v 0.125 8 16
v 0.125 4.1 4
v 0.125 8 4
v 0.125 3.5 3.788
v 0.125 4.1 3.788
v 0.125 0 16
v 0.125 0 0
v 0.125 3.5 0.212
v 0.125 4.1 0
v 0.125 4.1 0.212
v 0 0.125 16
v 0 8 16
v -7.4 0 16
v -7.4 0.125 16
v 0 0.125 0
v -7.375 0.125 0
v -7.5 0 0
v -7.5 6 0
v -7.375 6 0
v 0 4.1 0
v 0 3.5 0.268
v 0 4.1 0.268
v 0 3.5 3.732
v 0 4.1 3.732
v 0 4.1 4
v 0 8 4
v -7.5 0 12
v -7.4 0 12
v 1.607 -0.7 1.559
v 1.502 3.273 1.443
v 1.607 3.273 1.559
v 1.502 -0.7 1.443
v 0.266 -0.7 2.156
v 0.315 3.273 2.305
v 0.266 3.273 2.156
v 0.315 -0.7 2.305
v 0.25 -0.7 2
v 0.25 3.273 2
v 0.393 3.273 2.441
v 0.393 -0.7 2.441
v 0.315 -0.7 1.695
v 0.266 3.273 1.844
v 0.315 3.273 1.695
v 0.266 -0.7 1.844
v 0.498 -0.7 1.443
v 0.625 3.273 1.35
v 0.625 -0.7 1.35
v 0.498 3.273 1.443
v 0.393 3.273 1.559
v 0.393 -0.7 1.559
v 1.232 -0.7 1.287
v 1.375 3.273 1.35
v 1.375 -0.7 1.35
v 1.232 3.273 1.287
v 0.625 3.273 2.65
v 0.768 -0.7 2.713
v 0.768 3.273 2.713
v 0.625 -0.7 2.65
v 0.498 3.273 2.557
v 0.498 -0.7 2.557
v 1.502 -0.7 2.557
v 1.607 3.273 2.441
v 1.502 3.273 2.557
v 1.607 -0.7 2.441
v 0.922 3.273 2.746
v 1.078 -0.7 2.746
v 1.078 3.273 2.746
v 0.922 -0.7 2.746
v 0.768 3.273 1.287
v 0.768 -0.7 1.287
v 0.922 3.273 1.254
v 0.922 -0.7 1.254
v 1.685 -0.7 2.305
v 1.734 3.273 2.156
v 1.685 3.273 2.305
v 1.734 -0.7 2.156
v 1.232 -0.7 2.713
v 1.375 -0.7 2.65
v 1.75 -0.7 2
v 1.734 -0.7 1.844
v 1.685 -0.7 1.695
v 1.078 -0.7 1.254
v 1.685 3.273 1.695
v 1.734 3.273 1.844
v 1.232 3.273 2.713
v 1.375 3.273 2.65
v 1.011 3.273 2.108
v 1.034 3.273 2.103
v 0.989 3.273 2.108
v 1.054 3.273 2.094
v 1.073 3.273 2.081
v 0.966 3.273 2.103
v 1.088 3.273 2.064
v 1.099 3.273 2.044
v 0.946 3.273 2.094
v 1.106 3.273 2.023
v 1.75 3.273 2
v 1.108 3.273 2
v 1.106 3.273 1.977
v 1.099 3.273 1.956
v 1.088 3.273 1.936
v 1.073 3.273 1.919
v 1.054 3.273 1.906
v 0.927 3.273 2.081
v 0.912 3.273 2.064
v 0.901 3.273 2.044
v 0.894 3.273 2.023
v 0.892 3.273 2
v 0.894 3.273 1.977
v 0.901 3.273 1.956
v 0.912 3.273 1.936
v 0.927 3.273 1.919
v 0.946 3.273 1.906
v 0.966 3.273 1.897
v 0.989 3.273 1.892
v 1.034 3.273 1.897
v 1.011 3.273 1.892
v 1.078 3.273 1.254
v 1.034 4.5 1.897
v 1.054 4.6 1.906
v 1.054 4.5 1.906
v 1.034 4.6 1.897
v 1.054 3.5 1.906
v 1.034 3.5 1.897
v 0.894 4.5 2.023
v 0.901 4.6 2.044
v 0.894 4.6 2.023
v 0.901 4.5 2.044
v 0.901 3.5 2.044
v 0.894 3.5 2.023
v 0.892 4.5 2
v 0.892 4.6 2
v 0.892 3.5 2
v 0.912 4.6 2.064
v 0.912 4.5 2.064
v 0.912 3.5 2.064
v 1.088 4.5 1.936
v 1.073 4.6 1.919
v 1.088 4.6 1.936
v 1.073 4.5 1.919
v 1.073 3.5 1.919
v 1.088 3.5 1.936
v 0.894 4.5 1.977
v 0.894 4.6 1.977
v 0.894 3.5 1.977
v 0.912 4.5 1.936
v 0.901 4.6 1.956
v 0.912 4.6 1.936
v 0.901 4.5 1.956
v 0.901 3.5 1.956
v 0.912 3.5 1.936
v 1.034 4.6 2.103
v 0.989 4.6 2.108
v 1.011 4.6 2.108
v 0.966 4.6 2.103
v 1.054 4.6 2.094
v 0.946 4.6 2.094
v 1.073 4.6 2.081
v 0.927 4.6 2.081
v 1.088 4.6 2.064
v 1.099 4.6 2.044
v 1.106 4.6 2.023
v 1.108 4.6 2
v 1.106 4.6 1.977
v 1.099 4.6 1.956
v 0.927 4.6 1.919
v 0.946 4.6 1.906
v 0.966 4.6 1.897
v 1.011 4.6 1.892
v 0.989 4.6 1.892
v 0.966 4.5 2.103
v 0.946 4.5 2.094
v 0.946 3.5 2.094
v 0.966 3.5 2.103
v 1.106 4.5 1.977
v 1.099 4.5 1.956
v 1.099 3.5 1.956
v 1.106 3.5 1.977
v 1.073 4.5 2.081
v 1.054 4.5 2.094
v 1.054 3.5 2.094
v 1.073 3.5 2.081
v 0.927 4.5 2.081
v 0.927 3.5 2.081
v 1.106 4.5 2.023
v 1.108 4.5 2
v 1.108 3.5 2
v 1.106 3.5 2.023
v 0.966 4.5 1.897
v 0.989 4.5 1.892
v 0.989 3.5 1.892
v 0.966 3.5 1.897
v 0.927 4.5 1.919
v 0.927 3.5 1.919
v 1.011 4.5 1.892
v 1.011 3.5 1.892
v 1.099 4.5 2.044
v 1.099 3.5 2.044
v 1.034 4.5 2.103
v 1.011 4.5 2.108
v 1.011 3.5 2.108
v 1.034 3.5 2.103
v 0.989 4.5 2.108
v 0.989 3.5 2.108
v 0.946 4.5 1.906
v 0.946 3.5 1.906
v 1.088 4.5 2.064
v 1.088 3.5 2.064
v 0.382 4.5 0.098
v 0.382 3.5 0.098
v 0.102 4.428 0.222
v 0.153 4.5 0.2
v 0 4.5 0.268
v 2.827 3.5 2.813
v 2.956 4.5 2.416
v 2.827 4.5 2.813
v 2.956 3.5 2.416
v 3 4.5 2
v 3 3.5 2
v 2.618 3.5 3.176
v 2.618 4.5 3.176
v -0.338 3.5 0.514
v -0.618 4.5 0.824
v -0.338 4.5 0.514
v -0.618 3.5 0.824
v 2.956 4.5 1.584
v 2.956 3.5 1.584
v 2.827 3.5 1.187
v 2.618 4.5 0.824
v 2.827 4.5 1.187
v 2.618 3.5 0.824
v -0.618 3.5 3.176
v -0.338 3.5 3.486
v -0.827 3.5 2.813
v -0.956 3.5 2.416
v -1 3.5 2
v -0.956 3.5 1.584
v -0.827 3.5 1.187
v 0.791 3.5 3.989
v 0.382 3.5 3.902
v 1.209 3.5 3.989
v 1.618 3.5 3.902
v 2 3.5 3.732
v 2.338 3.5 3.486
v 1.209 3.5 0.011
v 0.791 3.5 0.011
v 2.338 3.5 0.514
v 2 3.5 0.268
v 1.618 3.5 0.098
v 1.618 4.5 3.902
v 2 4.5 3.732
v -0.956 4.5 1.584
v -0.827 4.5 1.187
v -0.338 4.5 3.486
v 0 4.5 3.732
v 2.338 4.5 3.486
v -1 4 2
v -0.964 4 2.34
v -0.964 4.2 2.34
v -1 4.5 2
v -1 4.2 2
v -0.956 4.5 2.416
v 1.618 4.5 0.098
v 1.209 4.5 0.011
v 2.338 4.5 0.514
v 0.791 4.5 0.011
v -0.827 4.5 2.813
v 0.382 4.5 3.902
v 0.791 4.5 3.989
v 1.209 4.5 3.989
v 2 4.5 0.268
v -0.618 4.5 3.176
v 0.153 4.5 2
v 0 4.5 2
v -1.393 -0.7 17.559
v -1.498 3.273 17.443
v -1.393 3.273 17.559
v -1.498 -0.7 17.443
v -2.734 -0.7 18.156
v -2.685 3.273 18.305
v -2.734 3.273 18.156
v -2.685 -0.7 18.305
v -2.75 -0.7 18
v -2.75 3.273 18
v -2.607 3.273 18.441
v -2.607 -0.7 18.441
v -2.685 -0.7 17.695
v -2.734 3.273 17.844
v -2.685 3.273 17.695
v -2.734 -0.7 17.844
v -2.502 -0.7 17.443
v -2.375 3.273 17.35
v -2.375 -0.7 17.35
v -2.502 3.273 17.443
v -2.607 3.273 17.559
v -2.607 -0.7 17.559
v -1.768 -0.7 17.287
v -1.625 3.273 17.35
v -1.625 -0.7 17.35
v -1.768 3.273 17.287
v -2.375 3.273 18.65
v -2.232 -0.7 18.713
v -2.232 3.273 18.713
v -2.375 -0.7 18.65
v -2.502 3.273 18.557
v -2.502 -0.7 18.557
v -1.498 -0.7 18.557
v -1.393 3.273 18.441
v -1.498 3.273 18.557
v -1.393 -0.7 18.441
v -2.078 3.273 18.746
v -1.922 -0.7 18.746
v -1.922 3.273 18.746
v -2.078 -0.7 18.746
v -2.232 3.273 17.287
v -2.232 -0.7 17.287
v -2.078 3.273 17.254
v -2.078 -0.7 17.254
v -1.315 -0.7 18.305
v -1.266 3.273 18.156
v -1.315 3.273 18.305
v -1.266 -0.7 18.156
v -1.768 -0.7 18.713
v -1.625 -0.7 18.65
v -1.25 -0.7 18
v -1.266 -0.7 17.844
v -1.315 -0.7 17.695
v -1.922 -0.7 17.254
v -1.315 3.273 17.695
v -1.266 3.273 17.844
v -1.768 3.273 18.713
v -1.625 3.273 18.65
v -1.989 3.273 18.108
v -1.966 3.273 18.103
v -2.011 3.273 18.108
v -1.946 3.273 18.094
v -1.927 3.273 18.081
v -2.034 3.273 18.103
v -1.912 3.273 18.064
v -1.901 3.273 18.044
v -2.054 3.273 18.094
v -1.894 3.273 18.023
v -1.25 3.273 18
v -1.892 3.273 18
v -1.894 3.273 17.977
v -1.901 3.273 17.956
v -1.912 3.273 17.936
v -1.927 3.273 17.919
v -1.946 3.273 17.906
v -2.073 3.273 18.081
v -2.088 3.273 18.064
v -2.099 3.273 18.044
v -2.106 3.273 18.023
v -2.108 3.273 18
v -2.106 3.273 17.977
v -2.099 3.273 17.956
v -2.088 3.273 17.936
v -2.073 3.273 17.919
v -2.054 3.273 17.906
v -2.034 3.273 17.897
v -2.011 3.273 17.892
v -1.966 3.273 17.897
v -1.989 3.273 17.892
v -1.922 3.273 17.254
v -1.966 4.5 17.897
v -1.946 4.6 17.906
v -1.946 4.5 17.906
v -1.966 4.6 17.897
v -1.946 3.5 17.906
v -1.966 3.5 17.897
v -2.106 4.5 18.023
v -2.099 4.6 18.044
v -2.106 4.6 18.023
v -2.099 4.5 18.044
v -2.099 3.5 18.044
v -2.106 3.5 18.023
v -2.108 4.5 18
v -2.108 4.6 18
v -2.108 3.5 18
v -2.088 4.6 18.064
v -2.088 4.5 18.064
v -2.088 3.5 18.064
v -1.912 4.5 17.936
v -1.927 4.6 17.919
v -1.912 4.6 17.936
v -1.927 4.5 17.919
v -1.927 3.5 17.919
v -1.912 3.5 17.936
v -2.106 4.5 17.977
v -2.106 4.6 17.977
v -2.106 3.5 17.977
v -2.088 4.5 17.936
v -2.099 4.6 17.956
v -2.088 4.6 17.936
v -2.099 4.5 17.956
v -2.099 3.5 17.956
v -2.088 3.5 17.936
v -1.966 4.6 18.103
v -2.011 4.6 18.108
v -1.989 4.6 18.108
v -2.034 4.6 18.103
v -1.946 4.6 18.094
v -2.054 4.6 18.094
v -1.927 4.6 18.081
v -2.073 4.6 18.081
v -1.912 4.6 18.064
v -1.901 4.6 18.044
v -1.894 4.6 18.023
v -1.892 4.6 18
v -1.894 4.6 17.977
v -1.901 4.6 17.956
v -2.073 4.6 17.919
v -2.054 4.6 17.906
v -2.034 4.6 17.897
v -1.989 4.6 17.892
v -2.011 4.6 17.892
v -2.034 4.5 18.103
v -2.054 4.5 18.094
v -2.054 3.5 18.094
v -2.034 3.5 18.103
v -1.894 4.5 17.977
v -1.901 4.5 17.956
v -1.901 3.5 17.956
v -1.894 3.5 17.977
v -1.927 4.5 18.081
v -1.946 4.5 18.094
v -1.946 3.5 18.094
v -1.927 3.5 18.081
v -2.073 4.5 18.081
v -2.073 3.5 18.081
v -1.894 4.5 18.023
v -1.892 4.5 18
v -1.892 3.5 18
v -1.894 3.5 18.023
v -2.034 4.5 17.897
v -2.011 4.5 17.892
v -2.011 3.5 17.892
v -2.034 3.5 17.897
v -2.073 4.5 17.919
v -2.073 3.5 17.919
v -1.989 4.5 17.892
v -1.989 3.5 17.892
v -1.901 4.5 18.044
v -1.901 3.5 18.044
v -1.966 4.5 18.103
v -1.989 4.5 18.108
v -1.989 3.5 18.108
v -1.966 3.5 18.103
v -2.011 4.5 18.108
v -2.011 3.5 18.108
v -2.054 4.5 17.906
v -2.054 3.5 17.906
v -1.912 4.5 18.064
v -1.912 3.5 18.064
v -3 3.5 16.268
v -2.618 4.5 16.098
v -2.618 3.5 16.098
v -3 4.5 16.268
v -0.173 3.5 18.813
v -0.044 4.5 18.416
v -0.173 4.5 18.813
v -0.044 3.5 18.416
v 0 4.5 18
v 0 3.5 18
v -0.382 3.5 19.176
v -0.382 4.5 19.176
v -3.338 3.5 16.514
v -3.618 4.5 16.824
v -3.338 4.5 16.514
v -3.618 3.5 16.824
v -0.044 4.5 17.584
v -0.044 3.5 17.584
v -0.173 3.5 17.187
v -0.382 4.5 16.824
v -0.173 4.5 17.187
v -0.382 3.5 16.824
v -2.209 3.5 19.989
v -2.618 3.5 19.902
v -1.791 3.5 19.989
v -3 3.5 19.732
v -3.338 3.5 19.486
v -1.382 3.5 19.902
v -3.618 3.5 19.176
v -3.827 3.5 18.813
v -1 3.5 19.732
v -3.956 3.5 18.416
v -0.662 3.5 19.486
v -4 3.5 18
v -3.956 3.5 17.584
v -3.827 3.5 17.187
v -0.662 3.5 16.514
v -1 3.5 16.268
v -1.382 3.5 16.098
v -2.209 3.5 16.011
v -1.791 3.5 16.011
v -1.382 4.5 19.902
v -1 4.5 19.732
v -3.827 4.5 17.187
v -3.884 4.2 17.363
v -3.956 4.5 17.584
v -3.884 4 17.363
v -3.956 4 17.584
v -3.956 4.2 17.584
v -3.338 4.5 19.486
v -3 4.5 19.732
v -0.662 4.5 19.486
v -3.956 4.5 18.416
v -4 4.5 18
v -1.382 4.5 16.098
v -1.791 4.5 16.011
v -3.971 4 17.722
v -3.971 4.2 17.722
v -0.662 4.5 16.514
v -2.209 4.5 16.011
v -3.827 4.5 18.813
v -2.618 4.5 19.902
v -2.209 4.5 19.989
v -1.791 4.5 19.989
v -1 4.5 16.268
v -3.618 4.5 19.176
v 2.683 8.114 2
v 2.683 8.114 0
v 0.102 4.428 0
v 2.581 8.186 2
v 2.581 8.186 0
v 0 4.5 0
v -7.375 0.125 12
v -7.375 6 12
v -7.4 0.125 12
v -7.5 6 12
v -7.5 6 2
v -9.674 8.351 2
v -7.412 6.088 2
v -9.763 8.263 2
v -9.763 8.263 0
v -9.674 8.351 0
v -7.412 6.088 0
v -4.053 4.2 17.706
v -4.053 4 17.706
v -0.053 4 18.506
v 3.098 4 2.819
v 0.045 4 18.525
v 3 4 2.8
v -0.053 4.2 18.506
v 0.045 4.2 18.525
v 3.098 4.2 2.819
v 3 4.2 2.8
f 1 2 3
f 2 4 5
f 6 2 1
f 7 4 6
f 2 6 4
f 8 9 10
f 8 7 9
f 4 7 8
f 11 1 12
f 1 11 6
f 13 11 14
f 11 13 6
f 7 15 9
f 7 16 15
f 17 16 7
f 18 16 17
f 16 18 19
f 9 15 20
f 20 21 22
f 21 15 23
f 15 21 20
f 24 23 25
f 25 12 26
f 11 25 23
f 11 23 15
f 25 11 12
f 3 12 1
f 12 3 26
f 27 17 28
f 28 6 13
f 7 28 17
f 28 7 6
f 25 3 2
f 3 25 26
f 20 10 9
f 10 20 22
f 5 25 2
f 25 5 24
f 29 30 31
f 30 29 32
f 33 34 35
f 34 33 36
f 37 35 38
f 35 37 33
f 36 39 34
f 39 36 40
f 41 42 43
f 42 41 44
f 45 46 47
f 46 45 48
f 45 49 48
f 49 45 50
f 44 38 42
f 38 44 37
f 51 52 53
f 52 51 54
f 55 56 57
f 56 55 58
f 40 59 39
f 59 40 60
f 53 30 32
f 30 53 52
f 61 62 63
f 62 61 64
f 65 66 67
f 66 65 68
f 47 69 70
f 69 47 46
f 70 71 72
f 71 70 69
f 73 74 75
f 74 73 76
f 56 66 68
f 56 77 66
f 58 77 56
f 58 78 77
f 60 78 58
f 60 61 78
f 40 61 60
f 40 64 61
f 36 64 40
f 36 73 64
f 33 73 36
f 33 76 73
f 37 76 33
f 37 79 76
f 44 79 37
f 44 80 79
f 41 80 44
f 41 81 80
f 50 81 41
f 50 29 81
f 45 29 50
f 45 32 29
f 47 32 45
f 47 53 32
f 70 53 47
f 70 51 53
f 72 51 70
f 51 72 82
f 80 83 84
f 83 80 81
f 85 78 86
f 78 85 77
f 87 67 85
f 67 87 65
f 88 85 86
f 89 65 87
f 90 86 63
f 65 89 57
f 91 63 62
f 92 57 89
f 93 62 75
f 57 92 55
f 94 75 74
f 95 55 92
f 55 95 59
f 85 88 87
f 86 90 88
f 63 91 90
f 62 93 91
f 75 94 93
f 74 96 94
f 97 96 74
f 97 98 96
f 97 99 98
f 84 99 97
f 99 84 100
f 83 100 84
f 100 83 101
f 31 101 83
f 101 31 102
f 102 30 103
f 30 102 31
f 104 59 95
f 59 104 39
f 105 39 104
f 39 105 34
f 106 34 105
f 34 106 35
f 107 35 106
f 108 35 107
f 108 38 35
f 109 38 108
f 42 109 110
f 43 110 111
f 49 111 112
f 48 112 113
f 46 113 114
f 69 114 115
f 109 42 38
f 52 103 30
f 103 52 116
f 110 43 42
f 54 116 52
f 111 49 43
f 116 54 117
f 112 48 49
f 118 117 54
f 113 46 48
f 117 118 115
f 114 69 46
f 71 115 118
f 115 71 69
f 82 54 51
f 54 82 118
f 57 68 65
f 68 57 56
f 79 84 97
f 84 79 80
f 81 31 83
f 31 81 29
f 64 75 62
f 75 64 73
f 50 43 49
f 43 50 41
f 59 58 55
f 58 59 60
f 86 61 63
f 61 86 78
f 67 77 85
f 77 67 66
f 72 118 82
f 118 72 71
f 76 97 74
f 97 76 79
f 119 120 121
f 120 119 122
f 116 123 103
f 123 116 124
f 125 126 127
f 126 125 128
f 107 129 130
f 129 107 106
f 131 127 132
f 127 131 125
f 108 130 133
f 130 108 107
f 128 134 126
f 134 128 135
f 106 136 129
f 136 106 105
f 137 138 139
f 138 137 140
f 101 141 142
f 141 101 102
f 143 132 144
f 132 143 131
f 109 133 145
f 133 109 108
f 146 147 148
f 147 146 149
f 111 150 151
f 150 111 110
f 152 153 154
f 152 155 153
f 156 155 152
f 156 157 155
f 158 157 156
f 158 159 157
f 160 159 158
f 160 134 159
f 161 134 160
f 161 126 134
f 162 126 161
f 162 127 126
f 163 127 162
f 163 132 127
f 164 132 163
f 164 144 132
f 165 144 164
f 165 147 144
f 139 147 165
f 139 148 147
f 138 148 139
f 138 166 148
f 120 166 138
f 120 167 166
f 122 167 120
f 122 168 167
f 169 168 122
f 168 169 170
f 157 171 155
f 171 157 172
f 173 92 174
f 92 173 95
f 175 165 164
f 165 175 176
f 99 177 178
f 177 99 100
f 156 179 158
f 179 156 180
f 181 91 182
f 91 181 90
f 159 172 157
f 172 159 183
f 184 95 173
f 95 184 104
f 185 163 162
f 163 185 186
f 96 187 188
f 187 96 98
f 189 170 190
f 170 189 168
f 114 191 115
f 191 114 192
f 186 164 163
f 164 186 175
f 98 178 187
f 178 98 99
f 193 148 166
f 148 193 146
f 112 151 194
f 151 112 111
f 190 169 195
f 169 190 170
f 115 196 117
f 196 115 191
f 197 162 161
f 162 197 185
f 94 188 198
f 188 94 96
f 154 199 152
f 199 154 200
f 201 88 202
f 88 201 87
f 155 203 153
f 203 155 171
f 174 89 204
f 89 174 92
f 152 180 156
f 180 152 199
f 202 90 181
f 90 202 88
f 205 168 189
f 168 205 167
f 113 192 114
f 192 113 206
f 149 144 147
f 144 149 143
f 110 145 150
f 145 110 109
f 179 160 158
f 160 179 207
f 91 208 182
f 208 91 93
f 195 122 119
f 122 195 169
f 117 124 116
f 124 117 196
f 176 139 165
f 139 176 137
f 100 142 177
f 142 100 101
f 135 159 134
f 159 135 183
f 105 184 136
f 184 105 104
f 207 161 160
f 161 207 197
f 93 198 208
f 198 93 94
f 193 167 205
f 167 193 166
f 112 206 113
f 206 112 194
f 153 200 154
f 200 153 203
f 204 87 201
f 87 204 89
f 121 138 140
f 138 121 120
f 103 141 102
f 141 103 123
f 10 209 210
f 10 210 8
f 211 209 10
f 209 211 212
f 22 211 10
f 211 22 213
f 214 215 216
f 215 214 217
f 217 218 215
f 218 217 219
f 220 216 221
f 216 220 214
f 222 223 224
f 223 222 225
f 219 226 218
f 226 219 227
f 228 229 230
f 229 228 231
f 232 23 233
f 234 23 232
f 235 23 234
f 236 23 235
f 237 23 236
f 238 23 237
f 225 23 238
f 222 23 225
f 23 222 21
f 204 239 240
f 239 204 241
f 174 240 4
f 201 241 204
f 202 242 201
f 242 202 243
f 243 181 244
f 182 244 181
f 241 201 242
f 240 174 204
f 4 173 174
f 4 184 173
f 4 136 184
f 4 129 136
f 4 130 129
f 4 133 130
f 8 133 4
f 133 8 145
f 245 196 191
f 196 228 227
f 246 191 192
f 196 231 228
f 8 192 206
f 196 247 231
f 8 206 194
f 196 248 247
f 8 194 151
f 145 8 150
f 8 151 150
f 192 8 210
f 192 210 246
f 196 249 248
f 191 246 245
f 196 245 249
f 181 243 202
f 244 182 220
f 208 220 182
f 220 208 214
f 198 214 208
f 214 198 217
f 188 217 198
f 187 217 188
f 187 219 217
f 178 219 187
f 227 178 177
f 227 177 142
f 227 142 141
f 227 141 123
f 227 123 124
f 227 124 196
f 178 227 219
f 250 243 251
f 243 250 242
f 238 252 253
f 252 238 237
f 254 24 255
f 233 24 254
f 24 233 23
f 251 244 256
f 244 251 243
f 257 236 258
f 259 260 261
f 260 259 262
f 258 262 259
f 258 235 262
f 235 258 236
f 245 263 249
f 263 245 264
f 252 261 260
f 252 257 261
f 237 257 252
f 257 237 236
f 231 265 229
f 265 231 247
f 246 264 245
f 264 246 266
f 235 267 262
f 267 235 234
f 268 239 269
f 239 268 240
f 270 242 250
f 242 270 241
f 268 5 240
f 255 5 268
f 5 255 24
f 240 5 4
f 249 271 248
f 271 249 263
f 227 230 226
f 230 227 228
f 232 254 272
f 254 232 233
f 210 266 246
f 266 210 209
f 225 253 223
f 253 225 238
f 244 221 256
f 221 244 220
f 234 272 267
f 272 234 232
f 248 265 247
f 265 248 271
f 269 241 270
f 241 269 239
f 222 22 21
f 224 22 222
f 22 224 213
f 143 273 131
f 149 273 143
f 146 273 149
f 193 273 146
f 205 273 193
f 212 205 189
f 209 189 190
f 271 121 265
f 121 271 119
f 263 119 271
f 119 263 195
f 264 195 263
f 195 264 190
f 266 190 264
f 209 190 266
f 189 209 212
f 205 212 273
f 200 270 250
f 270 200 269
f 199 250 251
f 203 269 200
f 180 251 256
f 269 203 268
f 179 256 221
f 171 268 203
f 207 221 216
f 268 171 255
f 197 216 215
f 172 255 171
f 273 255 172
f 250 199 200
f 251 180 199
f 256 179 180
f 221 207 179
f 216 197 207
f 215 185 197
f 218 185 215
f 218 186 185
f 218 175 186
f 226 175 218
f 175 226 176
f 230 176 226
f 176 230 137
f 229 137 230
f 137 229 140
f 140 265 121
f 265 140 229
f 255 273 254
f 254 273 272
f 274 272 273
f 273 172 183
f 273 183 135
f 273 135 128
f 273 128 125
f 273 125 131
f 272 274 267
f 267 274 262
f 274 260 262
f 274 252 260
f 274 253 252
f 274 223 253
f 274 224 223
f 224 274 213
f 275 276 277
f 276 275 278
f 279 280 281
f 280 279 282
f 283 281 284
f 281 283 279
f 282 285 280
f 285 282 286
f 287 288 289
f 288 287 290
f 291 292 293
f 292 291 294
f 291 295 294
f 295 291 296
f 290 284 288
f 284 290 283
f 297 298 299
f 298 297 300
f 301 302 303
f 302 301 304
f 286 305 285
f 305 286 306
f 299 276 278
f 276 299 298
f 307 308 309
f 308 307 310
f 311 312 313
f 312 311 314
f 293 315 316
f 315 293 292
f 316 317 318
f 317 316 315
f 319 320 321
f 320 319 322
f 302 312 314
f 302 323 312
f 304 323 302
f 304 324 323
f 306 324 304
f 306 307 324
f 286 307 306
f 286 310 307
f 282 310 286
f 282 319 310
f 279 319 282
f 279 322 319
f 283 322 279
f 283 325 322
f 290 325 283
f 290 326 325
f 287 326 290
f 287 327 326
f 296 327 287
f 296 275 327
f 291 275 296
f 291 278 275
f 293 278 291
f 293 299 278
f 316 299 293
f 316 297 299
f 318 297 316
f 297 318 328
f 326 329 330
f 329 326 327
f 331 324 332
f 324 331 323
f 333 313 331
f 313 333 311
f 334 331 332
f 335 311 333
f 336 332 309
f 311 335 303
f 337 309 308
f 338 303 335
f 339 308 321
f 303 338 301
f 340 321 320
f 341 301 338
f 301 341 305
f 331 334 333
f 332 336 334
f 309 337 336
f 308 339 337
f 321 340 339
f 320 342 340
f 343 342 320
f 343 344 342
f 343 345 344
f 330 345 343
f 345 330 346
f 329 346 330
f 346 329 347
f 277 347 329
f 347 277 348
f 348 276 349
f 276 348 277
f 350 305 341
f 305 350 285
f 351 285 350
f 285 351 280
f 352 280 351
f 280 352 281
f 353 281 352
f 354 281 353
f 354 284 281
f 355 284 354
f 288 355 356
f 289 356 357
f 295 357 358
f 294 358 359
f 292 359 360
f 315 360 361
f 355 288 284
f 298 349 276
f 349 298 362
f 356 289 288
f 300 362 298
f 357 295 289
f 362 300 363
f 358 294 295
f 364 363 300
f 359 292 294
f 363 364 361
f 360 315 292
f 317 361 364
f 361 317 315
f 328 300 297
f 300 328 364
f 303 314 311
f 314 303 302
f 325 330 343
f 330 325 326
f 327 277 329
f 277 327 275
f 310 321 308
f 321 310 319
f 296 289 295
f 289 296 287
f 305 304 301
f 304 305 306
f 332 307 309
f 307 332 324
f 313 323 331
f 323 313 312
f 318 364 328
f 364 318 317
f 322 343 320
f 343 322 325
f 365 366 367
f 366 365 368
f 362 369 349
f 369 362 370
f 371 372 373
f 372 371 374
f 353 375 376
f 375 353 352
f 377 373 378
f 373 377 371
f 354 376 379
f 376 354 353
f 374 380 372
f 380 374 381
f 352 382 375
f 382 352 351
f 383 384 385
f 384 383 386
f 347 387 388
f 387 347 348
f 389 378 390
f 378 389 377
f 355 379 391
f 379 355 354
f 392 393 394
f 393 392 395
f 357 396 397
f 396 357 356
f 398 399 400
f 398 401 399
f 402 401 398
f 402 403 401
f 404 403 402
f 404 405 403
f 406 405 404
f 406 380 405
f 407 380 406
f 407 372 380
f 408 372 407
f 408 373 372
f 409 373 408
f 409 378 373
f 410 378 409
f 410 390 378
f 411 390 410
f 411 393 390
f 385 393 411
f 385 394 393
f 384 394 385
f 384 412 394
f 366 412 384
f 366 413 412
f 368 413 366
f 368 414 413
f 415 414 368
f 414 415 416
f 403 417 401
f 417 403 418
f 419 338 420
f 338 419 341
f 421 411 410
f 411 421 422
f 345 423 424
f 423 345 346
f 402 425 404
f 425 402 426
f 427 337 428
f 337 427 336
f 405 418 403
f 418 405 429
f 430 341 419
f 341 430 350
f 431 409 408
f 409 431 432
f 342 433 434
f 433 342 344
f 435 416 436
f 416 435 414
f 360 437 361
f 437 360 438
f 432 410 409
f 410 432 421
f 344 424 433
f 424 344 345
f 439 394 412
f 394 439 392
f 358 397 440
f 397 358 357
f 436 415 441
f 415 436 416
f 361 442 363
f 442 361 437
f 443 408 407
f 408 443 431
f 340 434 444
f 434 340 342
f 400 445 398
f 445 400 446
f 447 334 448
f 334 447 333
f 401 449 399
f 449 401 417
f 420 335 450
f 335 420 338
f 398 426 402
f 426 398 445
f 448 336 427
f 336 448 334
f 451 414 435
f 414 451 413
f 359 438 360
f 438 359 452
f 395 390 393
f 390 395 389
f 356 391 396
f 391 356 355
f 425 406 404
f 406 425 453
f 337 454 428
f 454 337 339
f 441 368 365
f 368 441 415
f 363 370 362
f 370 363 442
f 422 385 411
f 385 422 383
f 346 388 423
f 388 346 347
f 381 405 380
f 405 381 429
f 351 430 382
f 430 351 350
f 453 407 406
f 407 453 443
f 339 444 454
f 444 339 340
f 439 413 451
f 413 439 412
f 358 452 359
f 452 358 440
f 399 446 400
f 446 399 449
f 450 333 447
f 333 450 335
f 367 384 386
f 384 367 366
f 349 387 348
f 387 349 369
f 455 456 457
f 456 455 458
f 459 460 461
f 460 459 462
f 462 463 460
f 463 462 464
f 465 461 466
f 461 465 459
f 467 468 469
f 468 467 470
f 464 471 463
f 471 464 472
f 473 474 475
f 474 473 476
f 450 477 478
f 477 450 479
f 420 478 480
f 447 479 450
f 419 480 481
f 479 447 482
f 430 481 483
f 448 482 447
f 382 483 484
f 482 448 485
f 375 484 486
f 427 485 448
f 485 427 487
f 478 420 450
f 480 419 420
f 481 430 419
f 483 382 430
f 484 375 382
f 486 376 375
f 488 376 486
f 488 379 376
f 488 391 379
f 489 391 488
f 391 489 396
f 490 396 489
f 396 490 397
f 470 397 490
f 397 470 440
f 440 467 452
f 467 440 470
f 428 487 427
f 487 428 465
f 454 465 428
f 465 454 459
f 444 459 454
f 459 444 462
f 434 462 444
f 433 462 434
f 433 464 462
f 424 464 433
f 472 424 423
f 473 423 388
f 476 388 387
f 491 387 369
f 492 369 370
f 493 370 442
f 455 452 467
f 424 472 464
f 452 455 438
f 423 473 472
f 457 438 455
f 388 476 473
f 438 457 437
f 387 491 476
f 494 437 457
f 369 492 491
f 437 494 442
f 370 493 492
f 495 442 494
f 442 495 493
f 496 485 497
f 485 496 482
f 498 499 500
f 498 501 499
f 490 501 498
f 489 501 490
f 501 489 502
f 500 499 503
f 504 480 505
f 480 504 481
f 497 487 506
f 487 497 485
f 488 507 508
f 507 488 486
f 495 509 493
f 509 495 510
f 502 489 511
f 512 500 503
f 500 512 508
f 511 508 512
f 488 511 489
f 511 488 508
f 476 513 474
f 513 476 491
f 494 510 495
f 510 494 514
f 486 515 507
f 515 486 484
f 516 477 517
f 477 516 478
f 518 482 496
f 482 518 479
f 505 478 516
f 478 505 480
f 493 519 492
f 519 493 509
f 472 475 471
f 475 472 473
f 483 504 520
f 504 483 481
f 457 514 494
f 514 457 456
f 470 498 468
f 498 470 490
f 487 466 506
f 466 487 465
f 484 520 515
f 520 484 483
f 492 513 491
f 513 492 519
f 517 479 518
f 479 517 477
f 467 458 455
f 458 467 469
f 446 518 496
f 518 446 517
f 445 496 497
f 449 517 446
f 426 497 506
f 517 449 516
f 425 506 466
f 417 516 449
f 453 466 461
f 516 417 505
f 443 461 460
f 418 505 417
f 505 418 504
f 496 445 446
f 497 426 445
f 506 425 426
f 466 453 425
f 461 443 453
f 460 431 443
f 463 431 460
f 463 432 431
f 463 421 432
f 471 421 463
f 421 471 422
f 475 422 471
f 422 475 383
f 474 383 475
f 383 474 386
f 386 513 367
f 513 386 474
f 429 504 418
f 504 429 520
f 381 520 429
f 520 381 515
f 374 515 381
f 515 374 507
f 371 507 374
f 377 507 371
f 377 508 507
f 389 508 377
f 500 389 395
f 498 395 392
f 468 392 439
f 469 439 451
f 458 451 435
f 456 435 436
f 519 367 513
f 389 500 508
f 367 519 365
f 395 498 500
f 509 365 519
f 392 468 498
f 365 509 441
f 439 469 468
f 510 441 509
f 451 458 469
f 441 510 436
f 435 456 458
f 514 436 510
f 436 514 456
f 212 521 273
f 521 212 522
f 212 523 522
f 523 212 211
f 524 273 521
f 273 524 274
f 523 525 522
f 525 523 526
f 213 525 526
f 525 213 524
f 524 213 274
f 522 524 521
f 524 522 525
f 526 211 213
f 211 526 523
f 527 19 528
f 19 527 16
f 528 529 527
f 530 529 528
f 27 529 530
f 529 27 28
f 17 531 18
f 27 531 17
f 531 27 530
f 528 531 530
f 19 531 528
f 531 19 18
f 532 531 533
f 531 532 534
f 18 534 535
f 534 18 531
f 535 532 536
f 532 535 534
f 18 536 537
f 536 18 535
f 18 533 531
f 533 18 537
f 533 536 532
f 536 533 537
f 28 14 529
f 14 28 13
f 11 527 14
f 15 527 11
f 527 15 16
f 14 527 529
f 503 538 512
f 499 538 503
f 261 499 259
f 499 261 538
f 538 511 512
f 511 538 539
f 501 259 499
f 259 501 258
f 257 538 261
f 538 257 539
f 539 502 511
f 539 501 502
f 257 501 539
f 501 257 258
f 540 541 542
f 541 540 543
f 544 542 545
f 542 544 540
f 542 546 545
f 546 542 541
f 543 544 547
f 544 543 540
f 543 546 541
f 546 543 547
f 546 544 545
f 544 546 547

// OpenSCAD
// file: RobotPrimitives.scad
//Triangle functions
//Return 3rd side for side_angle_side triangle
function Triangle_SAS_S() = sqrt((pow($L1, 2)) + (pow($L2, 2)) - (2 * $L1 * $L2 * cos($A)));
//Return included angle given 3 sides
function Triangle_SSS_A() = acos((pow($A1 , 2) + pow($A2, 2) - pow($O, 2)) / (2 * $A1 * $A2));

$HexToRScale        = 1.23607;

module RobotBaseSimple($DriveWheelDiameter = 6, $DriveFrameSize      = [28, 28.5, 3], $BumperDepth = 3.5)
{
    $DriveFrameSizeInner = [$DriveFrameSize[0] - 6, $DriveFrameSize[1] - 6, $DriveFrameSize[2] + 0.05];
    $BumperSize          = [$DriveFrameSize[0] + ($BumperDepth * 2), $DriveFrameSize[1] + ($BumperDepth * 2), 5];
    $FrontGap            = $DriveFrameSize[0] - 12;

    translate([0, 0, $DriveWheelDiameter / 2])
	difference()
	{
		union()
		{
			color([0.7, 0.2, 0.6, 0.5])
			difference()
			{
				cube($DriveFrameSize, center = true);
				cube($DriveFrameSizeInner, center = true);
			}
            translate([0, 0, 2])
 			color([0.3, 0.1, 0.5, 0.5])
            difference()
            {
				cube($BumperSize, center = true);
				cube($BumperSize - [2 * $BumperDepth, 2 * $BumperDepth, -1], center = true);
            }
			translate([13, 0, 0])
				WheelSet();
			translate([-13, 0, 0])
				WheelSet();
		}
		translate([0, 10, 0])
			cube([$FrontGap, 20, 30], center = true);
	}
}

module WheelSet()
{
	color("white")
	rotate(90, [0, 1, 0])
	{
		translate([0, -11, 0])
			cylinder(d = $DriveWheelDiameter, h = 1, $fn = 40, center = true);
		cylinder(d = $DriveWheelDiameter, h = 1, $fn = 40, center = true);
		translate([0, 11, 0])
			cylinder(d = $DriveWheelDiameter, h = 1, $fn = 40, center = true);
	}
}

module Tube($W = 2, $T = 1, $HoleDiameter = 1/4, $Center = 0, $Holes = undef)
{
	if ($Holes != undef)
		echo ($W,$T, $L, $Holes);
	else
		echo ($W,$T, $L);

	translate([0, 0, -$Center * ($L / 2)])
	{
		color("BLACK")
			translate([0, 0, $L / 2])
				WireBox($W = $W + 0.01, $T = $T + 0.01, $L = $L + 0.01);
		
		color([0.7, 0.7, 0.7])
			difference()
			{
				translate([-$W/2, -$T/2, 0])
					cube([$W, $T, $L]);
				translate([0.1-$W/2, 0.1-$T/2, -0.05])
					cube([$W - 0.2, $T - 0.2, $L + 0.1]);
				for($HoleCoord=$Holes)
				{
					translate([$HoleCoord[1], 0, $HoleCoord[0]])
						rotate(90, [1, 0, 0])
	#						cylinder(d = $HoleDiameter, h = $T + 2.1, $fn = 20, center = true);
				}
			}
		}
}

module WireBox()
{
	$OutlineSize = 0.05;
	difference()
	{
		cube([$W, $T, $L], center = true);
		cube([$W - $OutlineSize, $T - $OutlineSize, $L + 0.1], center = true);
		cube([$W + 0.1,          $T - $OutlineSize, $L - $OutlineSize], center = true);
		cube([$W - $OutlineSize, $T + 0.1         , $L - $OutlineSize], center = true);
	}
}

module FlatLBracket($L = 2.5, $W = 0.5)
{
	color($BracketColor)
	{
		cube([3/16, $W, $L]);
		cube([3/16, $L, $W]);
	}
}

module FlatPlate($L = 2.5, $W = 0.5)
{
	color($BracketColor)
	{
		cube([3/16, $W, $L]);
	}
}

module LBracket($L = 2.5, $W = 0.5)
{
	translate([-3/16, 0, 0])
		color($BracketColor)
		{
			cube([3/16, $W, $L]);
			translate([3/16, 0, 0])
				rotate(-90, [0, 1, 0])
					cube([3/16, $W, $L]);
		}
}

module CornerBracket($L = 2.5, $W = 0.5)
{
	translate([-3/16, 0, 0])
		color($BracketColor)
		{
			cube([3/16, $W, $L]);
			translate([3/16, 0, 0])
				rotate(-90, [0, 1, 0])
					cube([3/16, $W, $L]);
			translate([-$L, 0, 0])
			difference()
			{
				translate([3/16, 0, 3/16])
					cube([$L - (3/16), 3/16, $L - (3/16)]);
				translate([0, -0.02, 0])
					rotate(-45, [0, 1, 0])
						cube([$L * 1.5, 4/16, $L * 1.5]);

			}
		}
}

module VBearing($ID = 3/8, $OD = 1.2, $T = 3/8)
{
	difference()
	{
		union()
		{
			color("SILVER")
			{
				translate([0, 0, 0 * ($T / 4)])
					cylinder(d1 = $OD - .3, d2 = $OD, h = $T / 4, $fn = 50);
				translate([0, 0, 1 * ($T / 4)])
					cylinder(d2 = $OD - .3, d1 = $OD, h = $T / 4, $fn = 50);
				translate([0, 0, 2 * ($T / 4)])
					cylinder(d1 = $OD - .3, d2 = $OD, h = $T / 4, $fn = 50);
				translate([0, 0, 3 * ($T / 4)])
					cylinder(d2 = $OD - .3, d1 = $OD, h = $T / 4, $fn = 50);
			}
			color("BLACK")
				translate([0, 0, -0.01])
					cylinder(d = $ID + 0.2, h = $T + 0.02, $fn = 50);
		}
		translate([0, 0, -0.02])
			cylinder(d = $ID, h = $T + 0.04, $fn = 50);
	
	}
}

module NeverestSprocket()
{
  $fn = 40;
  $GuideInnerDiameter = (($SprocketTeethCount * 0.25) / 3.141);
  $GuideOuterDiameter = $GuideInnerDiameter + ((3/8));
  $SprocketTeethCount = 16;
  difference()
  {
    difference()
    {
      union()
      {
        translate([0, 0, (0.25 / 2)])
          scale(1/25.4)
          sprocket($ChainSize, $SprocketTeethCount, 0, 0, 0, $ChainGuideAngle);
        difference()
        {
          translate([0, 0, -0.22])
            cylinder(d = $GuideInnerDiameter - (7 / 25.4), h = 0.8, $fn = $SprocketTeethCount * 2);
          translate([0, .25, 0])
            cube([.22, .13, 5], center = true);
         }
      }
      difference()
      {
        cylinder(d = 0.25, h = 5, $fn = 20, center = true);
        translate([0, .35, 0])
          cube([.5, .5, 5], center = true);
      }
    }
    translate([0, 0, .18 - .27])
      rotate(-90, [1, 0, 0])
        cylinder(d = 4/25.4, h = 3, $fn = 20);
    translate([0, 0, .18 + .27])
      rotate(-90, [1, 0, 0])
        cylinder(d = 4/25.4, h = 3, $fn = 20);
  }
}

module HexSprocket()
{
  $GuideInnerDiameter = (($SprocketTeethCount * 0.25) / 3.141);
  $GuideOuterDiameter = $GuideInnerDiameter + ((3/8));
  {
    difference()
    {
      union()
      {
        translate([0, 0, (0.25 / 2)])
          scale(1/25.4)
          sprocket($ChainSize, $SprocketTeethCount, 0, 0, 0, $ChainGuideAngle);
        cylinder(d = $GuideInnerDiameter - (7 / 25.4), h = ((0.11 + 0.25)), $fn = $SprocketTeethCount * 2);
      }
      HexShaft($D = $HexBore, $L = 5, $Center = true);
    }
  }
}

module HexShaft($D = 0.5, $L = 5, $Center = false)
{
		cylinder(d = $D * $HexToRScale, h = $L, $fn = 6, center = $Center);
}

module NeverRestHexShaftMotorCoupler($HexShaftBore = 0.515)
{
  difference()
  {
    difference()
    {
      union()
      {
        difference()
        {
          translate([0, 0, -0.22])
            cylinder(d = 1.3, h = 0.8, $fn = 6);
          translate([0, .25, -0.42])
            cube([.22, .13, 1], center = true);
         }
      }
      difference()
      {
        cylinder(d = 0.25, h = 5, $fn = 20, center = true);
        translate([0, .35, 0])
          cube([.5, .5, 5], center = true);
      }
    }
    translate([0, 0, .18 - .25])
      rotate(-90, [1, 0, 0])
        cylinder(d = 4/25.4, h = 3, $fn = 20);
    translate([0, 0, .58 - 0.5])
      HexShaft($D = $HexShaftBore, $L = 1);
  }
}

module HexBearing()
{
  rotate(-90, [1, 0, 0])
    color([0.4, 0.4, 0.5])
      difference()
      {
        union()
        {
          cylinder(d = 1.225, h = 0.063, $fn = 40);
          translate([0, 0, 0.063])
            cylinder(d = 1.124, h = 0.25, $fn = 40);
        }
        if ($Shaft == 1)
        {
          translate([0, 0, -0.1])
            cylinder(d = 0.5, h = 2, $fn = 6);
        }
      }
}

module HexCoupler()
{
  color([0.3, 0.3, 0.4])
    rotate(90, [1, 0, 0])
      difference()
      {
        intersection()
        {
          cylinder(d = 1, h = 1.5, $fn = 20, center = true);
          cube([1, .879, 1.5], center = true);
        }
        cylinder(d = 0.5, h = 1.6, $fn = 6, center = true);
      }
}

module Wheel($Color = $ShooterFlywheelColor, $Diameter = $FlyWheelDiameter, $Thickness = 1)
{
  //Flywheel
    color($Color)
      cylinder(d = $Diameter, h = $Thickness, $fn = 30, center = true);
}

module MiniCIM()
{
  //Mounting Spaced at 2"
  color([0.2, 0.2, 0.2])
    cylinder(d = 2.5, h = 3.55, $fn = 30);
  color("SILVER")
    cylinder(d = 0.315, h = 3.55 + 1.402, $fn = 30);
}

module Neverest()
{
  color([0.6, 0.7, 0.75])
    cylinder(d = 1.5, h = 2.24 + 0.709 + 1.024, $fn = 30);
  color("SILVER")
    cylinder(d = 0.217, h = 5.3, $fn = 30);
}
// main file
use <RobotPrimitives.scad>

/* [Action] */
$Action = 5; //[1:Trajectory sim, 2:Launcher V1, 3:Launcher V2, 4:Full bot V1, 5: Ball intake]

/* [Trajectory sim] */
//Initial velocity exiting parallel to shooter (m/s)
$MuzzleVelocity = 7.5;
//Launch angle
$Angle = 70;
//Time of simulation in seconds
$SimDuration = 1;
//number of steps in simulation
$SimSteps = 20;
//Distance from wall to start line (inches)
$StartLineOffset = 50;

/* [Shooter] */
$FlyWheelDiameter = 4;
$Style = 0;//[0:Square, 1:Round]
$FeedFrom = 1;//[0:Top, 1:Bottom]
$MotorPlacement = 0;//[0:Outer, 1:Inner]

//Shooter parameters
$ShooterFeederSpacing = 8;
$ShooterGuideOpening = 8;

$LaunchCompression = 1;//
$ShooterV2GuideOpening = 8;//Width of the guide channel

/* [Hidden] */
$va = -9.8;//Vertcal acceleration (9.8m/s^2)
$ha = 0;//Zero acceleration horizontally
$BallDiameter = 7;
$inchtom = 0.0254;
$mtoinch = 1/$inchtom;
$mtofeet = $mtoinch / 12;
$Explode = 1.0;

$ShooterV2FeederSpacing = $BallDiameter + $FlyWheelDiameter - $LaunchCompression;//Spacing between drive wheel set centers

$ShooterFlywheelColor = [0.7, 0.1, 0.2];

DoAction();

module DoAction()
{
  if ($Action == 1)
  {
    scale($mtofeet * 12)
      ShooterTrajectoryTest();
  }
  else if ($Action == 2)
    ShooterV1Model();
  else if ($Action == 3)
    ShooterV2Model();
  else if ($Action == 4)
    FullBotV1();
  else if ($Action == 5)
    BallIntake();
}

module FullBotV1()
{
  $FlyWheelDiameter = 4;
  $Style = 1;//[0:Square, 1:Round]
  $FeedFrom = 1;//[0:Top, 1:Bottom]
  $MotorPlacement = 1;//[0:Outer, 1:Inner]
  
  RobotBaseSimple();
  translate([-7.5, -8, 22])
    rotate(180, [0, 0, 1])
      ShooterV2Model();
  translate([0, 10, 3.5])
    Ball();
  translate([4, 6, 3])
    BallIntake();
}

module BallIntake()
{
  //Left, drive plate
  difference()
  {
    cube([0.125, 8, 16]);
    translate([-0.01, 4.1, 0])
      cube([0.225, 4, 4]);
  }
    translate([0, 4.5, 0])
      rotate(-35, [0, 0, 1])
        cube([0.125, 4.5, 2]);
  //Right side
  translate([-7.5, 0, 0])
    cube([0.125, 6, 12]);
    translate([-7.5, 6.0, 0])
      rotate(45, [0, 0, 1])
        cube([0.125, 3.2, 2]);
  //Back
  translate([-7.4, 0, 0])
    cube([7.5, 0.125, 16]);
  //Drive wheel
  translate([1, 4, 2])
    rotate(90, [1, 0, 0])
    {
      Wheel($Diameter = 4, $Thickness = 1);
      translate([0, 0, 4.7])
        rotate(180, [0, 1, 0])
          Neverest();
    }
  //Kick wheel
  translate([-2, 4, 18])
    rotate(90, [1, 0, 0])
    {
      Wheel($Diameter = 4, $Thickness = 1);
      translate([0, 0, 4.7])
        rotate(180, [0, 1, 0])
          Neverest();
    }
  //Belt
  translate([-1, 4, 2])
    rotate(-11, [0, 1, 0])
      color("BLACK")
        cube([.1, .2, 16]);
  translate([3, 4, 2.8])
    rotate(-11, [0, 1, 0])
      color("BLACK")
        cube([.1, .2, 16]);
}

module ShooterV2Feeder()
{
  //Feeder
  difference()
  {
    cylinder(d = 16 + 0.125 + 0.125, h = 5, $fn = 80);
    translate([0, 0, 0.125])
      cylinder(d = 16, h = 7.1, $fn = 80);
    translate([0, -10, -1])
      cube([20, 20, 9]);
  }
  //Guide peg
  translate([0, 0, 0])
    cylinder(d = 0.5, h = 7, $fn = 20);
  
  //Feed channel
  difference()
  {
    if ($Style == 0)
    {
      translate([9, -4.3, 6.7])
        rotate(-20, [0, 1, 0])
          difference()
          {
            translate([0, 0, -1])
              cube([22, 7.5 + 0.125 + 0.125, 4], center = true);
            translate([0, 0, 0.125])
              cube([22.1, 7.5, 6], center = true);
          }
    }
    else
    {
      translate([-1.2, -4.7, 3.7])
      rotate(-20 + 90, [0, 1, 0])
      difference()
      {
        cylinder(d = 8.125, h = 22, $fn = 20);
        translate([-10, -5, 0])
          cube([10, 10, 30]);
        translate([0, 0, -0.5])
          cylinder(d = 8, h = 23, $fn = 20);
      }
    }
    translate([-8, -10, 0])
      cube([8, 10, 10]);
    translate([19, -10, 5])
      cube([8, 10, 10]);
  }
}

module ShooterV2Shooter()
{
  translate([15, 0, 4])
    {
  #  translate([-5, 0, -2])
      Ball();
    //Rear launcher
    ShooterV2Drive($Wheels = 1);
    //Leading launcher
    translate([-$ShooterV2FeederSpacing, 0, 0])
      ShooterV2Drive($Wheels = 1);
    //Feeder
    translate([-$ShooterV2FeederSpacing - 3.8, 0, 0])
      ShooterV2Drive($Wheels = 2, $FlyWheelDiameter = 4.0);
    //Support frame
    //Left
    translate([3.5, ($ShooterGuideOpening / 2) + 0.5 + (.125 / 2), 2])
      rotate(-90, [0, 1, 0])
        Tube($L = 20, $W = 1, $H = 1);
    //Right
    translate([3.5, -(($ShooterGuideOpening / 2) + 0.5 + (.125 / 2)), 2])
      rotate(-90, [0, 1, 0])
        Tube($L = 20, $W = 1, $H = 1);
    //Trailing
    translate([2.5, -(($ShooterGuideOpening / 2) + 1.0 + (.125 / 2)), 3])
        rotate(-90, [1, 0, 0])
          Tube($L = $ShooterGuideOpening + 2 + 0.125, $W = 2, $H = 1);
    //Leading
    translate([-10.5, -(($ShooterGuideOpening / 2) + 1.0 + (.125 / 2)), 3])
      rotate(-90, [1, 0, 0])
        Tube($L = $ShooterGuideOpening + 2 + 0.125, $W = 2, $H = 1);
    //Funnel
    translate([-7.5, 0, -4.5])
    {
      difference()
      {
        cube([23, $ShooterGuideOpening - 0.125, 7], center = true);
        translate([0, 0, 0.125])
          cube([23.1, $ShooterGuideOpening - (0.125 * 3), 7], center = true);
        translate([10, 0, -3.5])
          rotate(45, [0, 1, 0])
            cube([12, 12, 12], center = true);
        if ($Clip == 1)
          translate([-16.6, -4.5, -.6])
            rotate(35, [0, 1, 0])
              cube([5, 10, 10]);
      }
      translate([1.5, -($ShooterGuideOpening - 0.125)/ 2, -3.5])
        rotate(-45, [0, 1, 0])
          cube([7, $ShooterGuideOpening - 0.125, 0.125]);
    }
  }
}

module ShooterV2MotorPlate()
{
  difference()
  {
    //Main frame
    color([0.7,0.7, 0.8])
      cube([3.5, .125, 4.75], center = true);
    //Bearing opening
    translate([0, -.15, 0])
      HexBearing($Shaft = 0);
    //Motor bolt openings
    translate([1, 0, 0])
      rotate(90, [1, 0, 0])
        cylinder(d = 0.165, h = 1, $fn = 20, center = true);
    translate([-1, 0, 0])
      rotate(90, [1, 0, 0])
        cylinder(d = 0.165, h = 1, $fn = 20, center = true);
    //Adjustment slots
    translate([1.0, 0, 1.95])
      Slot($D = .165, $Length = 0.75, $H = .5);
    translate([-1.0, 0, 1.95])
      Slot($D = .165, $Length = 0.75, $H = .5);
    translate([1.0, 0, -1.95])
      Slot($D = .165, $Length = 0.75, $H = .5);
    translate([-1.0, 0, -1.95])
      Slot($D = .165, $Length = 0.75, $H = .5);
  }
}

module ShooterV2Drive()
{
  translate([0, $ShooterV2GuideOpening / 2, 0])
  {
    //Motor mount plate
    ShooterV2MotorPlate();
    //Bearing
    translate([0, -.15 * $Explode, 0])
      HexBearing($Shaft = 1);
    //Coupler
    translate([0, -1 * $Explode, 0])
      HexCoupler();
    //Motor spacer
    translate([0, .19 * $Explode, 0])
      MotorSpacer();

    translate([0, 3.86 * $Explode, 0])
      rotate(90, [1, 0, 0])
        MiniCIM();
    
    //Far side bearing plate
    translate([0, -8, 0])
      mirror([0, 1, 0])
      {
        //Motor mount plate
        ShooterV2MotorPlate();
        //Bearing
        translate([0, -.15 * $Explode, 0])
          HexBearing($Shaft = 1);
      }
      //Drive shaft
      color([0.7, 0.8, 0.8])
        translate([0, -1.2, 0])
          rotate(90, [1, 0, 0])
            cylinder(d = 0.5, h = $ShooterV2GuideOpening - 1, $fn = 6);
      //Drive wheel(s)
      if ($Wheels == 1)
      {
        translate([0, -$ShooterV2GuideOpening / 2, 0])
          rotate(90, [1, 0,0])
            Wheel();
      }
      else
      {
        translate([0, -($ShooterV2GuideOpening / 2) + 1.5, ])
          rotate(90, [1, 0,0])
            Wheel();
        translate([0, -($ShooterV2GuideOpening / 2) - 1.5, ])
          rotate(90, [1, 0,0])
            Wheel();
      }
  }  
}

module Slot()
{
  rotate(90, [1, 0, 0])
    hull()
    {
      translate([$Length / 2, 0, 0])
        cylinder(d = $D, h = $H, $fn = 20, center = true);
      translate([-$Length / 2, 0, 0])
        cylinder(d = $D, h = $H, $fn = 20, center = true);
    }
}

module MotorSpacer()
{
  color([0.7, 0.7, 0.8])
    rotate(90, [1, 0, 0])
      difference()
      {
        cylinder(d = 2.5, h = 0.25, $fn = 50, center = true);
        cylinder(d = 1.5, h = 0.26, $fn = 50, center = true);
        //Motor bolt openings
        translate([1, 0, 0])
          cylinder(d = 0.165, h = 1, $fn = 20, center = true);
        translate([-1, 0, 0])
          cylinder(d = 0.165, h = 1, $fn = 20, center = true);
      }
}

module ShooterV2Model()
{
  if ($FeedFrom == 0)//Top feed
  {
    translate([-8, 0, -16])
      rotate(-$Angle - 270, [0, 1, 0])
        mirror([0, $MotorPlacement, 0])
          ShooterV2Shooter($Clip = 0);
  }
  else//Bottom feed
  {
    translate([-11, 0, -12])
      rotate($Angle + 270, [0, 1, 0])
        mirror([0, $MotorPlacement, 0])
          ShooterV2Shooter($Clip = 0);
  }

  translate([-13, -3.8, -17.3])
  {
    ShooterV2Feeder();
    FeederBallSet();
  }
}

module Ball()
{
  sphere(d = $BallDiameter, $fn = 60);
}

module FeederBallSet()
{
  translate([13, 3.8, 17.3])
  {
    translate([-11, 0, -13])
      Ball();
    translate([-17.3, -3.1, -13.6])
      Ball();
    translate([-12.5, -8.4, -13.0])
      Ball();
    translate([-5.9, -8.4, -10.6])
      Ball();
    translate([0.7, -8.4, -8.2])
      Ball();
  }
}

module HexCoupler()
{
  color([0.3, 0.3, 0.4])
    rotate(90, [1, 0, 0])
      difference()
      {
        intersection()
        {
          cylinder(d = 1, h = 1.5, $fn = 20, center = true);
          cube([1, .879, 1.5], center = true);
        }
        cylinder(d = 0.5, h = 1.6, $fn = 6, center = true);
      }
}

module HexBearing()
{
  rotate(-90, [1, 0, 0])
    color([0.4, 0.4, 0.5])
      difference()
      {
        union()
        {
          cylinder(d = 1.225, h = 0.063, $fn = 40);
          translate([0, 0, 0.063])
            cylinder(d = 1.124, h = 0.25, $fn = 40);
        }
        if ($Shaft == 1)
        {
          translate([0, 0, -0.1])
            cylinder(d = 0.5, h = 2, $fn = 6);
        }
      }
}

module ShooterV1ChannelGuide()
{
  intersection()
  {
    difference()
    {
      cube([11, 1/4, 11], center = true);
      rotate(90, [1, 0, 0])
        cylinder(d = $ShooterGuideOpening, h = 1, $fn = 50, center = true);
    }
    rotate(22.5, [0, 1, 0])
      rotate(90, [1, 0, 0])
        cylinder(d = 13, h = 1, $fn = 8, center = true);
  }
}

module ShooterV1Model()
{
  //Channel guides
  translate([0, -2, 0])
    difference()
    {
      ShooterV1ChannelGuide();
        cube([20, 1, 5], center = true);
    }
  translate([0, 2.5, 0])
    ShooterV1ChannelGuide();
  translate([0, 5.5, 0])
    ShooterV1ChannelGuide();
  translate([0, 10.5, 0])
    ShooterV1ChannelGuide();
  //Motors
  translate([-($BallDiameter + 1/4) / 2, 0, 0])
    ShooterV1SideMotorSet();
  mirror([1, 0, 0])
    translate([-($BallDiameter + 1/4) / 2, 0, 0])
      ShooterV1SideMotorSet();
  //Channel supports
  for (i = [0:7])
  {
    //Flat support guides
    rotate(360 * i / 8, [0, 1, 0])
    {
      if ((i == 2) || (i == 6))
      {
        translate([-0.5, 2.3, -($ShooterGuideOpening / 2) - 0.2])
          cube([1, 3.4, 1/4]);
      }
      else
      translate([-0.5, -2.15, -($ShooterGuideOpening / 2) - 0.2])
        cube([1, 13, 1/4]);
    }
    if ((i != 2) && (i != 6))
    {
      color("SILVER")
        rotate(360 * i / 8, [0, 1, 0])
          translate([0, -2.5, -($ShooterGuideOpening / 2) - .8])
            rotate(-90, [1, 0, 0])
              cylinder(d = 3/8, h = 13.5, $fn = 20);
    }
  }
}

module ShooterV1SideMotorSet()
{
  translate([-2.6 / 2, 0, -4.4])
    ShooterMotorWheelSet();
  translate([-2.6 / 2, $ShooterFeederSpacing, -4.4])
    ShooterMotorWheelSet();
}

module ShooterMotorWheelSet()
{
  MiniCIM();
  translate([0, 0, 4.4])
    Wheel();
}

module ShooterTrajectoryTest()
{
  PowerPort();
  translate([-$StartLineOffset * $inchtom, 0, 0])
    ShowTrajectory();
}

module ShowTrajectory()
{
  
  vu = $MuzzleVelocity*sin($Angle);//Vertical initial velocity component, +ve = up
  hu = $MuzzleVelocity*cos($Angle);//Horizontal initial velocity component
  echo(vu);
  for (step = [0: $SimSteps])
  {
    t = (step * $SimDuration)/ $SimSteps;
    vs=(vu*t) + (0.5*$va*(t*t));
    hs=(hu*t) + (0.5*$ha*(t*t));
    translate([hs, 0, vs])
      sphere(d = 7 * $inchtom, $fn = 20);
  }
}

module PowerPort()
{
  //Outer port
  difference()
  {
    //Main support
    translate([0, 0, 10*12*$inchtom / 2])
      cube([1 * $inchtom, 4*12*$inchtom, 10*12*$inchtom], center = true);
    //Outer port opening
    translate([0, 0, 98.25 * $inchtom])
      rotate(90, [0, 0, 1])
        rotate(90, [1, 0, 0])
          cylinder(d = (30 * $inchtom) / 0.866026, h = .1, $fn = 6, center = true);//Hex included circle conversion
    //Bottom port opening
    translate([-0.05, - 34 * $inchtom / 2, 18 * $inchtom])
      cube([.1, 34 * $inchtom, 10 * $inchtom]);
  }
  //Inner port
  translate([29.25 * $inchtom, 0, 98.25 * $inchtom])
  {
    difference()
    {
      cube([1 * $inchtom, 4*12*$inchtom, 3*12*$inchtom], center = true);
      rotate(90, [0, 1, 0])
        cylinder(d = 13 * $inchtom, h = 0.1, $fn = 50, center = true);
    }
  }
}
